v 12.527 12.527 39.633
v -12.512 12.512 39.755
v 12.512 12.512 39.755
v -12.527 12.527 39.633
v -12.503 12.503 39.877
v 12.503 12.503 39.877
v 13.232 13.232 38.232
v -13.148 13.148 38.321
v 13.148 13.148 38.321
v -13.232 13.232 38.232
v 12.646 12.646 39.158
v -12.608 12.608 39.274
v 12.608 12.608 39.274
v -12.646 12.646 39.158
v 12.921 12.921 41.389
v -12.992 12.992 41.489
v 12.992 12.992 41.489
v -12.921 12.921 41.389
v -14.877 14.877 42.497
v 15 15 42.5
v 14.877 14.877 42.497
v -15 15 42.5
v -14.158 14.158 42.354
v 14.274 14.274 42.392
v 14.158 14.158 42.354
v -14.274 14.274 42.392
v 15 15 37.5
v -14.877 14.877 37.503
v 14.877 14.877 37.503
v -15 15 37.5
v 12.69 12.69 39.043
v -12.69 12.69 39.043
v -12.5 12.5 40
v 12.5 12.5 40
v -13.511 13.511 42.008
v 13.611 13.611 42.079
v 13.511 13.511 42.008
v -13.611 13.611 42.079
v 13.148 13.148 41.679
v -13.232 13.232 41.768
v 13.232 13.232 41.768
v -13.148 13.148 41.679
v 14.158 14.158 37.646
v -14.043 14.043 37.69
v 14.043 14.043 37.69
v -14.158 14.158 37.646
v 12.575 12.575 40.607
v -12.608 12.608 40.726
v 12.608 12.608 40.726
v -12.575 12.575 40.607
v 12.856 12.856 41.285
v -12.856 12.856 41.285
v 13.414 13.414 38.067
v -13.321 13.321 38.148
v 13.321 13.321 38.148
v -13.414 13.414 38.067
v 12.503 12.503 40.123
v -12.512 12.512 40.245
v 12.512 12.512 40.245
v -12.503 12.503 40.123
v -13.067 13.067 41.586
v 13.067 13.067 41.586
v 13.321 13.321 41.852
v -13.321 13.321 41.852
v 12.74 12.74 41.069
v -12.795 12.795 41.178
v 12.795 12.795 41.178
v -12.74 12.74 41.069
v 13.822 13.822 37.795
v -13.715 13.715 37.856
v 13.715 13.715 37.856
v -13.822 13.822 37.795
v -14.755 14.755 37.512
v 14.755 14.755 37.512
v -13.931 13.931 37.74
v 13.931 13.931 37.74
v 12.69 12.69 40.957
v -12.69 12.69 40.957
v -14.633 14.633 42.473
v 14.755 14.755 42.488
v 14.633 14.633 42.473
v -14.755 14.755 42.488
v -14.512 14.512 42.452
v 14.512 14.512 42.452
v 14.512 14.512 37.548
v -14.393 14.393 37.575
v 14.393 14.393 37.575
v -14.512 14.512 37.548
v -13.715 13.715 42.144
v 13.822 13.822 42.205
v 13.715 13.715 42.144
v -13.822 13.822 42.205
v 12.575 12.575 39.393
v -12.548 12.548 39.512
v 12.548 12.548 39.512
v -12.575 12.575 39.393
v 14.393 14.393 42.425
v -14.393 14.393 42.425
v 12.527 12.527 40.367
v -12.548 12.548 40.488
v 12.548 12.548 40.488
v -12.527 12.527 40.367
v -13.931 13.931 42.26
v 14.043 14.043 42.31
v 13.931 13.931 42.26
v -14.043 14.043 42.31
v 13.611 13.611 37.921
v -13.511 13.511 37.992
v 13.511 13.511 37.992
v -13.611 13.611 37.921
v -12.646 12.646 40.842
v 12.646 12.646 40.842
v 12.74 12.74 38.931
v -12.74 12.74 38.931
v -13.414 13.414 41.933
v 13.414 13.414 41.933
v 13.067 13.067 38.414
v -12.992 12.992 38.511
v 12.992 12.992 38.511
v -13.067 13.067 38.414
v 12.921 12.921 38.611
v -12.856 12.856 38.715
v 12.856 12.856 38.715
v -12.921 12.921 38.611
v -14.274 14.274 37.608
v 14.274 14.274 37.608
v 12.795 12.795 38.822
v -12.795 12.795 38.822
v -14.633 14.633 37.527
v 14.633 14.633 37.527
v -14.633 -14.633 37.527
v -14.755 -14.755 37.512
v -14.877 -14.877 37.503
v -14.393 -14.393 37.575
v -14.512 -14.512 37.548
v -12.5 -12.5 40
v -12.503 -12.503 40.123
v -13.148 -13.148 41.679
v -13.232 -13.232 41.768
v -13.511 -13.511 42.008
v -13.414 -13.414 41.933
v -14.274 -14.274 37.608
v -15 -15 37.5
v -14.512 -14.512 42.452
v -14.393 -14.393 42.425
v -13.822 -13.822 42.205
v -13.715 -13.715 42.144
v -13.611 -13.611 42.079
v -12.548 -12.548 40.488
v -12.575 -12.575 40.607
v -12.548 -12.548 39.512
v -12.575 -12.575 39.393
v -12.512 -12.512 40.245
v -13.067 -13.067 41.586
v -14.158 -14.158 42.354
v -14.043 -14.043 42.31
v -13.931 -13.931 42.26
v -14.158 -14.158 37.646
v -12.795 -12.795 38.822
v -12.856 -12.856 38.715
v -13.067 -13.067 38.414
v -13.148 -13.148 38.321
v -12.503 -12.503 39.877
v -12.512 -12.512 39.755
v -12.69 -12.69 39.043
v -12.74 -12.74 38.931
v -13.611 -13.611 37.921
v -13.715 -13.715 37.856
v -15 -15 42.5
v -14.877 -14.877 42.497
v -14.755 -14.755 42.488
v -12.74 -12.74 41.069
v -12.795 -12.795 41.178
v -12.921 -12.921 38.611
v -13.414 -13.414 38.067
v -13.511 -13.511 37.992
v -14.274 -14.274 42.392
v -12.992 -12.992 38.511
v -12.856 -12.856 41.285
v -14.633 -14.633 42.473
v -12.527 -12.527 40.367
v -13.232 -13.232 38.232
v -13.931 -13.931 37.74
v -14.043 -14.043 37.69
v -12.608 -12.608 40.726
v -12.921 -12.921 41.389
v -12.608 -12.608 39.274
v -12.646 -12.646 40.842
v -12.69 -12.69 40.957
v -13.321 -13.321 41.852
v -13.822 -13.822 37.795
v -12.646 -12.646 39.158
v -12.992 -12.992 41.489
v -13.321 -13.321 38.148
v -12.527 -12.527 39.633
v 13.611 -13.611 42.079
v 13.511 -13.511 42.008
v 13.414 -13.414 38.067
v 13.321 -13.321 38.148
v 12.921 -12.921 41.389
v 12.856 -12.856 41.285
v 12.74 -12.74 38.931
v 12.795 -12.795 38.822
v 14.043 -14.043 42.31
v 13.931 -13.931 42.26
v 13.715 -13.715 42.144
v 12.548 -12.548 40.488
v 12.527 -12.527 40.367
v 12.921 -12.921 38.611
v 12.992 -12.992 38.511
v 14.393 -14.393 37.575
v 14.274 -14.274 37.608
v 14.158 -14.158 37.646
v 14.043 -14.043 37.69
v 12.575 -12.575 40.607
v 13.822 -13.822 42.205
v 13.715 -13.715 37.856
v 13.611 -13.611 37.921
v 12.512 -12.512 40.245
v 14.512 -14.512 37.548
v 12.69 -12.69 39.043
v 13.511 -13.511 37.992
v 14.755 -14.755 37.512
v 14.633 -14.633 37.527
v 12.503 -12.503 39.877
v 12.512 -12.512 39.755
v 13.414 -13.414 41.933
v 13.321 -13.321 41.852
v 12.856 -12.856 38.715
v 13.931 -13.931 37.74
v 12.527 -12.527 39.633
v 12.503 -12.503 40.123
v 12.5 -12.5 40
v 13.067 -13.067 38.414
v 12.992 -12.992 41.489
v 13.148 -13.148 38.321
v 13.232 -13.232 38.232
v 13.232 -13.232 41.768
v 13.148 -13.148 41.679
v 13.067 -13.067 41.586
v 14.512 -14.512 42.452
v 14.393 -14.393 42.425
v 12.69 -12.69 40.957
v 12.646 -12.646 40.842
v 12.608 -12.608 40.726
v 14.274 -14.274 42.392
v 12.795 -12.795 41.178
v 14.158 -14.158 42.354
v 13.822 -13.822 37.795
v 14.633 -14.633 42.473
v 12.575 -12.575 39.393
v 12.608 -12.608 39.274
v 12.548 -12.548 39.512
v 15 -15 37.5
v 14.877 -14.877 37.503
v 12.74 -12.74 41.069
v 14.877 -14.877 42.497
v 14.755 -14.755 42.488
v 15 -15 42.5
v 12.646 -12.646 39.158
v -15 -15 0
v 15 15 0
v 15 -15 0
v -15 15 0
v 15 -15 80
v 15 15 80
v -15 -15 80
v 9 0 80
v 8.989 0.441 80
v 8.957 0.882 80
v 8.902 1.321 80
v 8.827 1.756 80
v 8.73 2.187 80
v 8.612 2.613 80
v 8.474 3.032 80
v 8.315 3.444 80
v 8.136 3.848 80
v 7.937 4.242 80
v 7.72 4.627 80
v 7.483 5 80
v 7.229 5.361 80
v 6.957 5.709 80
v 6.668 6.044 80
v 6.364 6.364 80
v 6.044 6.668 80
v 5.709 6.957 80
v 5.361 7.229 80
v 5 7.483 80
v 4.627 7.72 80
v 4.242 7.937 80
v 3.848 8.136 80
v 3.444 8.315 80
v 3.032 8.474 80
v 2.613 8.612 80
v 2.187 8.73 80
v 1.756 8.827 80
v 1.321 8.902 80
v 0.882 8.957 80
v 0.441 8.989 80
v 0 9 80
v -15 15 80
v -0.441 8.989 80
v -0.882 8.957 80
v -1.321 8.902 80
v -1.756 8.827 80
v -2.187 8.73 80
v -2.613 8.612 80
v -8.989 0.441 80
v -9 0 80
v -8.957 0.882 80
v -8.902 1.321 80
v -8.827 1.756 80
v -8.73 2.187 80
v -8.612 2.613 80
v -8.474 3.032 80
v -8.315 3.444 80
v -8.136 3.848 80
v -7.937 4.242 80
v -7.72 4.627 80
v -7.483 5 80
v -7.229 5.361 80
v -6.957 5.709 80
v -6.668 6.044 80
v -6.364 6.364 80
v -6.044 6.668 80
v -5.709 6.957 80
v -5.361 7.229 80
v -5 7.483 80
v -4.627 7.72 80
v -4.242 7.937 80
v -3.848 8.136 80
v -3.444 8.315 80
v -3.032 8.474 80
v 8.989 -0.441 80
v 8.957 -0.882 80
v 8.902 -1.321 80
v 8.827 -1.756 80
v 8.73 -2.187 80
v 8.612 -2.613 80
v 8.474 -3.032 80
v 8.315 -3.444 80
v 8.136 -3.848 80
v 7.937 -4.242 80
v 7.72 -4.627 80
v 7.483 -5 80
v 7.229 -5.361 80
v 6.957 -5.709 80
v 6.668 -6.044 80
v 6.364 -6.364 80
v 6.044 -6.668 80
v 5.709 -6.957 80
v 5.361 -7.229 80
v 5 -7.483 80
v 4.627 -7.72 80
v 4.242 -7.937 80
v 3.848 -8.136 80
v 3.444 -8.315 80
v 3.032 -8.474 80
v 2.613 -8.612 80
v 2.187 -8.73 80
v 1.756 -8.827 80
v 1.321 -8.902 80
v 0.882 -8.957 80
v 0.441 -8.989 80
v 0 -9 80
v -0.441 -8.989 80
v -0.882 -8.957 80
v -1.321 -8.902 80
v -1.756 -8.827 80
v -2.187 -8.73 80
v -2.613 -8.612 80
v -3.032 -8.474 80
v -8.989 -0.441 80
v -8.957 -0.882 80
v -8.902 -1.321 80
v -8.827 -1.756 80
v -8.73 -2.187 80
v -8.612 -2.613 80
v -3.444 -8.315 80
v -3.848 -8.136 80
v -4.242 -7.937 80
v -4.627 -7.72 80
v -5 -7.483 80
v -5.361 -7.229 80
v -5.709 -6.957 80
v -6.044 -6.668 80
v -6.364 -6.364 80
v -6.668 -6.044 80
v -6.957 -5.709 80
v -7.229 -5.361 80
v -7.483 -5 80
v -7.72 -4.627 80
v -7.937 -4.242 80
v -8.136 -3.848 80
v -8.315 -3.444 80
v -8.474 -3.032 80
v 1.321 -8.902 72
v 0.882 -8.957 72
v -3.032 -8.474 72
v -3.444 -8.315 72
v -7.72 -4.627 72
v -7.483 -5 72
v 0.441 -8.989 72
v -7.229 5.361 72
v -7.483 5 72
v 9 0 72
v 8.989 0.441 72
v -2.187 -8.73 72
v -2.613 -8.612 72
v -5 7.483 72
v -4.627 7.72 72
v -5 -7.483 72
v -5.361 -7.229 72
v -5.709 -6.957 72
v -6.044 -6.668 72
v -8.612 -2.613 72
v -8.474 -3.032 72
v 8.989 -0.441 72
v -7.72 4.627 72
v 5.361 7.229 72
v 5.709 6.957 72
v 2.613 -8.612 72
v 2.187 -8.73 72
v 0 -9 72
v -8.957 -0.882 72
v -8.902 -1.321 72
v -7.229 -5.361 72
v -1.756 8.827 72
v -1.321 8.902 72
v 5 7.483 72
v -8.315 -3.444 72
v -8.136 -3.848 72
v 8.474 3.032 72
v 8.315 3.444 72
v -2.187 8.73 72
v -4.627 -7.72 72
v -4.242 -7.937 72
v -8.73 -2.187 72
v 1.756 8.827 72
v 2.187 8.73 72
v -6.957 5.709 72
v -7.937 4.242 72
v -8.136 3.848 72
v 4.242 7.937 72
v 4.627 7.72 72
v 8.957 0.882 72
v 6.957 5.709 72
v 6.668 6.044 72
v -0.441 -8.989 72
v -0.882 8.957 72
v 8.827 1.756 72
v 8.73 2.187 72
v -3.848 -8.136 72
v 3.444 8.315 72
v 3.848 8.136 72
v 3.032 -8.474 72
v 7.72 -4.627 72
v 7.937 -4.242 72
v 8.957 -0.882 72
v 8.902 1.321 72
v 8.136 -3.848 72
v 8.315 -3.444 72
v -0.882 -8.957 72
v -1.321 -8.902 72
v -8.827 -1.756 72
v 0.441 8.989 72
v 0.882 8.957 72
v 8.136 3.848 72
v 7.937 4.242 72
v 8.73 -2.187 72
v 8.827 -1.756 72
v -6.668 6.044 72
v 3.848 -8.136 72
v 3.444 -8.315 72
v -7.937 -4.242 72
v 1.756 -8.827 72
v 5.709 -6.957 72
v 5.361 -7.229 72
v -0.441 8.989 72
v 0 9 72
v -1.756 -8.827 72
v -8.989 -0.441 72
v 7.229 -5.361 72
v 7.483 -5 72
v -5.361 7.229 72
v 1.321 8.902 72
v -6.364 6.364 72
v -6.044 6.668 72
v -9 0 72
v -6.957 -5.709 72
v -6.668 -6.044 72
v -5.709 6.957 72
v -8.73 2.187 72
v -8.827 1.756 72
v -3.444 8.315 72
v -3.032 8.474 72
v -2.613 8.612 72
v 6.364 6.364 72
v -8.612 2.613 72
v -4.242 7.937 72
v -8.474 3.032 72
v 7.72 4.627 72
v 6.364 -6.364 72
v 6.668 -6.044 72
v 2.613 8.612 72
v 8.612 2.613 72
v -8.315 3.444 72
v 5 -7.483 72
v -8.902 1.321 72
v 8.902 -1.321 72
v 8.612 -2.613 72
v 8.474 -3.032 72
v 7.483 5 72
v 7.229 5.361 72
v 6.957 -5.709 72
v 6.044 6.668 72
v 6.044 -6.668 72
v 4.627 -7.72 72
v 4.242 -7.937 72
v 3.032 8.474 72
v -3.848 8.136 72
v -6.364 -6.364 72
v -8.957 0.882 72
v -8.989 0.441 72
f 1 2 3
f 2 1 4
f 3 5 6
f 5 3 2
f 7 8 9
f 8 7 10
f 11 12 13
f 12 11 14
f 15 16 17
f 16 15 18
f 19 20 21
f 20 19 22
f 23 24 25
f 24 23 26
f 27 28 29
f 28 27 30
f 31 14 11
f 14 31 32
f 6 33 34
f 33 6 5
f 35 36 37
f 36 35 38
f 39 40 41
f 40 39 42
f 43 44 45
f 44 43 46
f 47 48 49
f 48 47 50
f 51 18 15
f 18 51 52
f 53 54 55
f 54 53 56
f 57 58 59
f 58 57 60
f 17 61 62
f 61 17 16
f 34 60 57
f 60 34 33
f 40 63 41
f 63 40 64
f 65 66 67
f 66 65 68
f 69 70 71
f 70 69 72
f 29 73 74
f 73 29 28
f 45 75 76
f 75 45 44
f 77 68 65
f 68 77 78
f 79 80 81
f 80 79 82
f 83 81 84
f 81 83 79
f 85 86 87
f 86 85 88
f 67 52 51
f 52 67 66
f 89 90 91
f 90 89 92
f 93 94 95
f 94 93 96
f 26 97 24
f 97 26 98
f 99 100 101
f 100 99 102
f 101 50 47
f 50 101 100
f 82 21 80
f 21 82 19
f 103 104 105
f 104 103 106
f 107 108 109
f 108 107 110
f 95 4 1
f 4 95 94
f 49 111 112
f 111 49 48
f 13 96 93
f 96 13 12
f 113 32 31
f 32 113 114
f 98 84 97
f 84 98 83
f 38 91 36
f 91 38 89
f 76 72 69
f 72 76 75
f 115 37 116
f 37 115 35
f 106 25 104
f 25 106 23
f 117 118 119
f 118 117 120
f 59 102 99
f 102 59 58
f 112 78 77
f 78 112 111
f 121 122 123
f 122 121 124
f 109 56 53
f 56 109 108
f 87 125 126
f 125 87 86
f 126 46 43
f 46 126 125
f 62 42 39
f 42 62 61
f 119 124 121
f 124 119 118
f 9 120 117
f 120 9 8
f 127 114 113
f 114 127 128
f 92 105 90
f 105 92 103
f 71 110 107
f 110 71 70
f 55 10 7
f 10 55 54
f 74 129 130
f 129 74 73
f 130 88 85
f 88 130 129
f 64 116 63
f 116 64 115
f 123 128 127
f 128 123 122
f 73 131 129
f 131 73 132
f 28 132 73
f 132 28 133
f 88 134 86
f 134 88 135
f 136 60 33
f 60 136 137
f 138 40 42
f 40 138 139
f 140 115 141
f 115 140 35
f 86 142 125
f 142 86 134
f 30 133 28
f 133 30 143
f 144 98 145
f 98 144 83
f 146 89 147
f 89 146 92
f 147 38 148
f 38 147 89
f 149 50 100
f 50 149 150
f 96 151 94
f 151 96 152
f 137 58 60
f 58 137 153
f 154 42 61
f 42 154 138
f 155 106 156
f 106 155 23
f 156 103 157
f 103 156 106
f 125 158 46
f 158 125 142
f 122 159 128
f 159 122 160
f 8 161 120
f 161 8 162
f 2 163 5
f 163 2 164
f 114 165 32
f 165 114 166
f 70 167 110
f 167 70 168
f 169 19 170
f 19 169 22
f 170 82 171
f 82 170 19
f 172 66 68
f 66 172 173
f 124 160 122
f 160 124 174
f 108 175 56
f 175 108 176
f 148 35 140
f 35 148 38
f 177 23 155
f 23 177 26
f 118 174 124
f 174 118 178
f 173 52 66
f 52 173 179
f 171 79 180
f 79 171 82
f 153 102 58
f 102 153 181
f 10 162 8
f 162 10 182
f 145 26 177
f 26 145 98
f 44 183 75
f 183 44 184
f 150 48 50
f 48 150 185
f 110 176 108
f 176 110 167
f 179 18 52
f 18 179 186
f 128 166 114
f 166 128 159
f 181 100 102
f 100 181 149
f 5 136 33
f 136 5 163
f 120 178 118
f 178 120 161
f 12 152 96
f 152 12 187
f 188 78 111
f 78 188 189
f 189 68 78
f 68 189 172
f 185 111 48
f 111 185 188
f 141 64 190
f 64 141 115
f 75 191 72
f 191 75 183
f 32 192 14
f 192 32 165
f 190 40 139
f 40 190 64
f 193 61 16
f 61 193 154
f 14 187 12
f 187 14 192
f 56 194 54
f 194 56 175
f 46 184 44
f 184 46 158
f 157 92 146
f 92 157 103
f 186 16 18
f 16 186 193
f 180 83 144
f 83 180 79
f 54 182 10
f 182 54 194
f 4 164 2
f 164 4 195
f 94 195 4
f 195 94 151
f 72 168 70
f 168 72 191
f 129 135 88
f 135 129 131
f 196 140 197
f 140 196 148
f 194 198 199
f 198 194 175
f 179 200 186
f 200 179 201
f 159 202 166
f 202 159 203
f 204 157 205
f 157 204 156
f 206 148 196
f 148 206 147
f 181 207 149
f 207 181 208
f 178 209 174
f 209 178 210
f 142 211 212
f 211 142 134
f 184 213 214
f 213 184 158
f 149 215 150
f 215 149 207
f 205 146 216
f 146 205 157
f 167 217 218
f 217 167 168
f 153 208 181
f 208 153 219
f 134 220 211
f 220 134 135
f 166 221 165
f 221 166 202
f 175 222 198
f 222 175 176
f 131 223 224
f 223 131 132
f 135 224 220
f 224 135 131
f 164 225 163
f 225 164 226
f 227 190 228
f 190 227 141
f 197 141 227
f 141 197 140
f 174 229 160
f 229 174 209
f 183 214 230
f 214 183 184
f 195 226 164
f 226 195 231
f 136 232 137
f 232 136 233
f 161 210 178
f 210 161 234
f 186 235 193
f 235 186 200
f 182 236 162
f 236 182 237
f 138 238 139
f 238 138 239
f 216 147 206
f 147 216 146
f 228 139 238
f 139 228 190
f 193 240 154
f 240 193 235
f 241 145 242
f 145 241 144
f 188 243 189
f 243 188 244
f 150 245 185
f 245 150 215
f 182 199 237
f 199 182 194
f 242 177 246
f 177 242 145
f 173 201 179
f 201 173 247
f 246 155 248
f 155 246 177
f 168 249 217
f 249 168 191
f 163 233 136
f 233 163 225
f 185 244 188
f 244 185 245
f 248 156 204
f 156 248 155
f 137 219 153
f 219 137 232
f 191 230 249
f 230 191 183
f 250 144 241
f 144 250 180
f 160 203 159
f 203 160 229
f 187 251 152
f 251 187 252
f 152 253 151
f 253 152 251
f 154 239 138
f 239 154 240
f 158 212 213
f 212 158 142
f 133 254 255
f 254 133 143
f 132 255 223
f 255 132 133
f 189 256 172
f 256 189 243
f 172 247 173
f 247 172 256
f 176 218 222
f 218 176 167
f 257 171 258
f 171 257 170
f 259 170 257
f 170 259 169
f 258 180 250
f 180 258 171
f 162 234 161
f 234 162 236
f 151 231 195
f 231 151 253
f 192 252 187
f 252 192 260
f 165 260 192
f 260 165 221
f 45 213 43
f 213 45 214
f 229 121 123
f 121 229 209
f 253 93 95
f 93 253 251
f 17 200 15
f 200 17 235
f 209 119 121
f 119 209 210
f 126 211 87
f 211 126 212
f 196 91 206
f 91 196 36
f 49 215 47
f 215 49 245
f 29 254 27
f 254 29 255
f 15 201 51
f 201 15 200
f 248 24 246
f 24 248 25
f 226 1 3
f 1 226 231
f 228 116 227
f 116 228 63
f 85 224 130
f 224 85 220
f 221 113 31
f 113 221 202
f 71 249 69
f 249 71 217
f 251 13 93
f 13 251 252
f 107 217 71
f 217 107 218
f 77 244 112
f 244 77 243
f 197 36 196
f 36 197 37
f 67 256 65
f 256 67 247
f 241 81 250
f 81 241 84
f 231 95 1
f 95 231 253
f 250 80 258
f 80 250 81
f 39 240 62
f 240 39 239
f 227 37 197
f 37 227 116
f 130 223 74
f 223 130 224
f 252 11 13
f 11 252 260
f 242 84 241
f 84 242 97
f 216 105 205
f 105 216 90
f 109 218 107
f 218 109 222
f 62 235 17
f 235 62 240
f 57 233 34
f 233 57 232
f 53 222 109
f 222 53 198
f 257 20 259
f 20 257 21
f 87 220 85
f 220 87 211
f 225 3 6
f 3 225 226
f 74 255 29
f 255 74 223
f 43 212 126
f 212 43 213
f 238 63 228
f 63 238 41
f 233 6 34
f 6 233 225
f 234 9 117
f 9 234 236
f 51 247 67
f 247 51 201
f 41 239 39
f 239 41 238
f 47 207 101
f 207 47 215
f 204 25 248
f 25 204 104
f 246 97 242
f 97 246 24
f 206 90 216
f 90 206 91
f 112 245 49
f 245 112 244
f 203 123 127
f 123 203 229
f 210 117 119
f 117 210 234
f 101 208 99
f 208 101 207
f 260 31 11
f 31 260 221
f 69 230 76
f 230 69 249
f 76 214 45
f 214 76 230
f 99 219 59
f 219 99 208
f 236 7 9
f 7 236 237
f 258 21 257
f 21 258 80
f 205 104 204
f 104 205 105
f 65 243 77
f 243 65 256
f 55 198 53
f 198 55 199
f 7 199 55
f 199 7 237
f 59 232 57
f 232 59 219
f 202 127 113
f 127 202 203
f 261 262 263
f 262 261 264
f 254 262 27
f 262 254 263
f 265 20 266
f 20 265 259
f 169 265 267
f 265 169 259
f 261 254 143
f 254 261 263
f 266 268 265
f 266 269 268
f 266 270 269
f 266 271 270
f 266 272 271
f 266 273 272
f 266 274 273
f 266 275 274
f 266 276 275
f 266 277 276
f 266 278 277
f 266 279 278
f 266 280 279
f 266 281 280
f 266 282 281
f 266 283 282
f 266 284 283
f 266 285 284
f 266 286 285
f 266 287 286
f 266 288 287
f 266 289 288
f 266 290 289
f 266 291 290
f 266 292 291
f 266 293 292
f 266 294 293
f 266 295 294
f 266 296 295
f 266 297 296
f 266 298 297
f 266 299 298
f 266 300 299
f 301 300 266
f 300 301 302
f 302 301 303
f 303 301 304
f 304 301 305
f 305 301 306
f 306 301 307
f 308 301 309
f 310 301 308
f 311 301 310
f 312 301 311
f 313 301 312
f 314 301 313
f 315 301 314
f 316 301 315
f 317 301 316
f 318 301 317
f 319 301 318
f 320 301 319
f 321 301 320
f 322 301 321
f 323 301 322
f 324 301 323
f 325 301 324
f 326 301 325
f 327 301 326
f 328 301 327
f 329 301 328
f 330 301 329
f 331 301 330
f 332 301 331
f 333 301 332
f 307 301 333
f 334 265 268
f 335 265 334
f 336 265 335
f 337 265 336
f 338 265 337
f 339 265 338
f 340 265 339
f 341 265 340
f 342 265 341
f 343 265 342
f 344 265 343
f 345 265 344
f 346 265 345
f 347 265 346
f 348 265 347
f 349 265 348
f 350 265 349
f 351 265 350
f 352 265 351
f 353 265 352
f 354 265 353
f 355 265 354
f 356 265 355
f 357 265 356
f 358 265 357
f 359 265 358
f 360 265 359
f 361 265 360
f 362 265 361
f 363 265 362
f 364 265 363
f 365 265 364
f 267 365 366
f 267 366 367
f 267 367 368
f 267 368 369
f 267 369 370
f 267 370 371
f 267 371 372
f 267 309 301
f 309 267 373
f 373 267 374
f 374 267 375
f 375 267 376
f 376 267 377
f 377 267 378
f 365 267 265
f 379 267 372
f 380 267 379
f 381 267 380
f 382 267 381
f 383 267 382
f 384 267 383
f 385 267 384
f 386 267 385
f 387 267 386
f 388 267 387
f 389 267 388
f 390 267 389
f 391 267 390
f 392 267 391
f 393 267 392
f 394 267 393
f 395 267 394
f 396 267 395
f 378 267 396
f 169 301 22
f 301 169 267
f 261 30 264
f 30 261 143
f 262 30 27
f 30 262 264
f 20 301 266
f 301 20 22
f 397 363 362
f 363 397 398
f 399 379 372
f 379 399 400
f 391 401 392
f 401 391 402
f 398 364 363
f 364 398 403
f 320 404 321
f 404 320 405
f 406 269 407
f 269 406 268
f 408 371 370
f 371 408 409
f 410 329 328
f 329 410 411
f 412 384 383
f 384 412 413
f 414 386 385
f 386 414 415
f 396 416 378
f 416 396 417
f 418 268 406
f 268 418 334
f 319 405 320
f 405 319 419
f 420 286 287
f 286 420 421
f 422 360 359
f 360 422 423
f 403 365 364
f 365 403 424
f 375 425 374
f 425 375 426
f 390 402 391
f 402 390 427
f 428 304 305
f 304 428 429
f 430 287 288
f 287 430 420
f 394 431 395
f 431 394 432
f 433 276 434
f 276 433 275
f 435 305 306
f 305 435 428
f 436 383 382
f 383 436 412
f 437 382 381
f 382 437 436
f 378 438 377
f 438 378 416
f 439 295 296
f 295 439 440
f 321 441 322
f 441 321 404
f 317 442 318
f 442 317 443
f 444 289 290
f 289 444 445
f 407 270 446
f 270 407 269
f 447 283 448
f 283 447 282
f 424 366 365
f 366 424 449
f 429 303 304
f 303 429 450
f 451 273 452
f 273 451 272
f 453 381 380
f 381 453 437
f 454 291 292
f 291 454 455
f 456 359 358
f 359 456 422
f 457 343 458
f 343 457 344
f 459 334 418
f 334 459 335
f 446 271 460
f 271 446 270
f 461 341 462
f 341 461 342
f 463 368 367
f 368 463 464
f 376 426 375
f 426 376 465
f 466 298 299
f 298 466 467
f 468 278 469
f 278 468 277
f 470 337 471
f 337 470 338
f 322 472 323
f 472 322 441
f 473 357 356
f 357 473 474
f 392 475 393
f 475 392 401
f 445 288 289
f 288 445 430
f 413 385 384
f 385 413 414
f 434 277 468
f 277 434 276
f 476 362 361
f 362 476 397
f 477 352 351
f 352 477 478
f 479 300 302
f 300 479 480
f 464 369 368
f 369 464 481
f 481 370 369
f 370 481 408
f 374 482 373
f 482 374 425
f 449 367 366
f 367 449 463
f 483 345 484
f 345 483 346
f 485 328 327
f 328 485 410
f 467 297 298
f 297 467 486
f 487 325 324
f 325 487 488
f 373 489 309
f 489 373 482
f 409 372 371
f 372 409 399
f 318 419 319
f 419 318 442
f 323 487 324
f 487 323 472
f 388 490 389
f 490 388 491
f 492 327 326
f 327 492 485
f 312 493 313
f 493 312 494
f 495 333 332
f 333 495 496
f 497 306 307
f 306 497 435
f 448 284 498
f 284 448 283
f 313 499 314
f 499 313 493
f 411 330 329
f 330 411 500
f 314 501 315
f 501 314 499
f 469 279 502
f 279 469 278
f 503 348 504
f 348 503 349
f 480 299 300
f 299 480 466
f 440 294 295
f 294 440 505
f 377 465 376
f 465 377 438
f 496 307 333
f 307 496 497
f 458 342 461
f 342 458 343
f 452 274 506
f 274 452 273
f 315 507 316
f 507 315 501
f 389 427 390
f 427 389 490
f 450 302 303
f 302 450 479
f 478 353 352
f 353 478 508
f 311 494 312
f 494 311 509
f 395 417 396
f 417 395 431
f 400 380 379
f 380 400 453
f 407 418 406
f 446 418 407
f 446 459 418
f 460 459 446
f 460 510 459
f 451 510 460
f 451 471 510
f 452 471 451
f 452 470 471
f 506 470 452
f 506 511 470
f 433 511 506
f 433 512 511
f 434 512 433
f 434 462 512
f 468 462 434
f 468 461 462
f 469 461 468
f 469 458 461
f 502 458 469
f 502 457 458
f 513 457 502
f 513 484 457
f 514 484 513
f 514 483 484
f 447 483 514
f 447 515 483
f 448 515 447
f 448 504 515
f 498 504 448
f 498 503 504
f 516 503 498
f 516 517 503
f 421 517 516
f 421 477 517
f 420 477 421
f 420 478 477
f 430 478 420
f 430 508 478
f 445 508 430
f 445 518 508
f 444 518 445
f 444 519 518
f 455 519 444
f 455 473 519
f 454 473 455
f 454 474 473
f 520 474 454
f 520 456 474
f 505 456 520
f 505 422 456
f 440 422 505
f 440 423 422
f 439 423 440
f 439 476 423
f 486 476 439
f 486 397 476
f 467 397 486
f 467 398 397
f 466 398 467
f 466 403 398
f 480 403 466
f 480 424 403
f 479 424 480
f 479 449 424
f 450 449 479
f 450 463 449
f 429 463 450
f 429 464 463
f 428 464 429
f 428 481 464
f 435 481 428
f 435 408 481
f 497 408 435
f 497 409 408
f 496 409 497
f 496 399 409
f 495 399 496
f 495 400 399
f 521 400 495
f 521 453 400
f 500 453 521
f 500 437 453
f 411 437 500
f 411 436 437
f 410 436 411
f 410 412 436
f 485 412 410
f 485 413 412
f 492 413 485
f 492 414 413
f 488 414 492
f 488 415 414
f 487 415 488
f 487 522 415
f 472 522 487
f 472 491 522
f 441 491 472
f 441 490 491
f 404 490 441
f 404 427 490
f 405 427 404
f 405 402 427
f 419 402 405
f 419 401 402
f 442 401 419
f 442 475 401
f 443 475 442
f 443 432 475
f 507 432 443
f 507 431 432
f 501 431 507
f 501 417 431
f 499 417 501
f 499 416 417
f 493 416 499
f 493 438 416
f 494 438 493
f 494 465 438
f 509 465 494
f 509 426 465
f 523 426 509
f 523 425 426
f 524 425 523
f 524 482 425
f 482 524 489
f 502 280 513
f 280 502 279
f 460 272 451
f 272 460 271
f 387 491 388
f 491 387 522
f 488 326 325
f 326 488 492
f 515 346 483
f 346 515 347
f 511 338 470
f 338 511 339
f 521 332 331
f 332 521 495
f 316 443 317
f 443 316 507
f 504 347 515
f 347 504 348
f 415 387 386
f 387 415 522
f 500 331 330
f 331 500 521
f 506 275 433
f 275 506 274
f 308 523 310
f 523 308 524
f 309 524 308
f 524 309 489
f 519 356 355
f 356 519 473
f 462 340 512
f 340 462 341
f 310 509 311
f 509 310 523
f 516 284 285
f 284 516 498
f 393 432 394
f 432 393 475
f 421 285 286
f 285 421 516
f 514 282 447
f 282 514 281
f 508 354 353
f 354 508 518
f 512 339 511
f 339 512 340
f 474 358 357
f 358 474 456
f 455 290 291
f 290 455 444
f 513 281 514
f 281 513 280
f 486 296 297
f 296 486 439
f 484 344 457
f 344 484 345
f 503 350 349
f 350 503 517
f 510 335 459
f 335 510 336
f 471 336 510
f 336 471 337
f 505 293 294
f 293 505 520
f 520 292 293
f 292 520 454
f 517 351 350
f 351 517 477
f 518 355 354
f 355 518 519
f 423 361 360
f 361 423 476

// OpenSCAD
difference()
{
    difference()
    {
        linear_extrude(height = 80.0, twist = 0.0, scale = 1.0, slices = 1, center = false)
        {
            scale([30.0, 30.0])
            {
                M8();
            }
        }
        union()
        {
            union()
            {
                union()
                {
                    translate([-15.0, 15.0, 40.0])
                    {
                        rotate([0.0, 0.0, 0.0])
                        {
                            rotate([0.0, 90.0, 0.0])
                            {
                                rotate([0.0, 0.0, 0.0])
                                {
                                    linear_extrude(height = 31.0, twist = 0.0, scale = 1.0, slices = 1, center = false)
                                    {
                                        scale([5.0, 5.0])
                                        {
                                            M196();
                                        }
                                    }
                                }
                            }
                        }
                    }
                    translate([-15.0, 15.0, 40.0])
                    {
                        rotate([0.0, 0.0, 0.0])
                        {
                            rotate([0.0, 0.0, 0.0])
                            {
                                rotate([90.0, 0.0, 0.0])
                                {
                                    linear_extrude(height = 31.0, twist = 0.0, scale = 1.0, slices = 1, center = false)
                                    {
                                        scale([5.0, 5.0])
                                        {
                                            M196();
                                        }
                                    }
                                }
                            }
                        }
                    }
                }
                translate([-15.0, -15.0, 40.0])
                {
                    rotate([0.0, 0.0, 0.0])
                    {
                        rotate([0.0, 90.0, 0.0])
                        {
                            rotate([0.0, 0.0, 0.0])
                            {
                                linear_extrude(height = 31.0, twist = 0.0, scale = 1.0, slices = 1, center = false)
                                {
                                    scale([5.0, 5.0])
                                    {
                                        M196();
                                    }
                                }
                            }
                        }
                    }
                }
            }
            translate([15.0, 15.0, 40.0])
            {
                rotate([0.0, 0.0, 0.0])
                {
                    rotate([0.0, 0.0, 0.0])
                    {
                        rotate([90.0, 0.0, 0.0])
                        {
                            linear_extrude(height = 31.0, twist = 0.0, scale = 1.0, slices = 1, center = false)
                            {
                                scale([5.0, 5.0])
                                {
                                    M196();
                                }
                            }
                        }
                    }
                }
            }
        }
    }
    translate([0.0, 0.0, 72.0])
    {
        linear_extrude(height = 10.0, twist = 0.0, scale = 1.0, slices = 1, center = false)
        {
            difference()
            {
                scale([18.0, 18.0])
                {
                    M196();
                }
                scale([0.0, 0.0])
                {
                    M196();
                }
            }
        }
    }
}

module M196()
{
    polygon
    (
        points =
        [
            [0.5, 0.0], 
            [0.4993977281025862, 0.024533837163709007], 
            [0.49759236333609846, 0.0490085701647803], 
            [0.4945882549823905, 0.07336523722768087], 
            [0.4903926402016152, 0.09754516100806412], 
            [0.485015626597272, 0.12149008995163194], 
            [0.4784701678661044, 0.14514233862723117], 
            [0.4707720325915104, 0.16844492669611003], 
            [0.46193976625564337, 0.1913417161825449], 
            [0.45199464656172167, 0.21377754671514104], 
            [0.4409606321741775, 0.23569836841299882], 
            [0.42886430500013606, 0.25705137209661083], 
            [0.4157348061512726, 0.2777851165098011], 
            [0.40160376574032247, 0.2978496522462167], 
            [0.3865052266813685, 0.31719664208182274], 
            [0.37047556267747955, 0.33577947742350917], 
            [0.3535533905932738, 0.35355339059327373], 
            [0.33577947742350917, 0.37047556267747955], 
            [0.31719664208182274, 0.3865052266813685], 
            [0.29784965224621673, 0.4016037657403224], 
            [0.27778511650980114, 0.4157348061512726], 
            [0.25705137209661083, 0.42886430500013606], 
            [0.2356983684129989, 0.44096063217417747], 
            [0.2137775467151411, 0.45199464656172167], 
            [0.19134171618254492, 0.46193976625564337], 
            [0.16844492669611003, 0.4707720325915104], 
            [0.14514233862723117, 0.47847016786610447], 
            [0.12149008995163199, 0.485015626597272], 
            [0.09754516100806417, 0.4903926402016152], 
            [0.07336523722768087, 0.4945882549823905], 
            [0.049008570164780385, 0.4975923633360984], 
            [0.024533837163709063, 0.4993977281025862], 
            [3.061616997868383E-17, 0.5], 
            [-0.024533837163709004, 0.4993977281025862], 
            [-0.04900857016478032, 0.49759236333609846], 
            [-0.07336523722768082, 0.4945882549823905], 
            [-0.0975451610080641, 0.4903926402016152], 
            [-0.12149008995163194, 0.485015626597272], 
            [-0.14514233862723108, 0.47847016786610447], 
            [-0.16844492669610997, 0.4707720325915104], 
            [-0.19134171618254486, 0.46193976625564337], 
            [-0.21377754671514093, 0.4519946465617217], 
            [-0.23569836841299885, 0.4409606321741775], 
            [-0.25705137209661083, 0.42886430500013606], 
            [-0.277785116509801, 0.41573480615127273], 
            [-0.2978496522462167, 0.40160376574032247], 
            [-0.3171966420818227, 0.38650522668136855], 
            [-0.3357794774235092, 0.3704755626774795], 
            [-0.35355339059327373, 0.3535533905932738], 
            [-0.37047556267747944, 0.3357794774235093], 
            [-0.3865052266813685, 0.31719664208182274], 
            [-0.4016037657403224, 0.29784965224621673], 
            [-0.4157348061512727, 0.2777851165098011], 
            [-0.428864305000136, 0.2570513720966109], 
            [-0.44096063217417747, 0.23569836841299893], 
            [-0.45199464656172167, 0.21377754671514101], 
            [-0.46193976625564337, 0.19134171618254495], 
            [-0.47077203259151035, 0.16844492669611016], 
            [-0.4784701678661044, 0.1451423386272312], 
            [-0.485015626597272, 0.12149008995163203], 
            [-0.4903926402016152, 0.0975451610080643], 
            [-0.4945882549823905, 0.0733652372276809], 
            [-0.4975923633360984, 0.04900857016478041], 
            [-0.4993977281025862, 0.024533837163708983], 
            [-0.5, 6.123233995736766E-17], 
            [-0.4993977281025862, -0.024533837163708862], 
            [-0.49759236333609846, -0.049008570164780295], 
            [-0.4945882549823905, -0.07336523722768079], 
            [-0.4903926402016152, -0.09754516100806418], 
            [-0.485015626597272, -0.12149008995163191], 
            [-0.47847016786610447, -0.14514233862723105], 
            [-0.4707720325915104, -0.16844492669611005], 
            [-0.4619397662556434, -0.19134171618254484], 
            [-0.4519946465617217, -0.2137775467151409], 
            [-0.4409606321741775, -0.23569836841299882], 
            [-0.42886430500013606, -0.2570513720966108], 
            [-0.41573480615127273, -0.277785116509801], 
            [-0.40160376574032247, -0.2978496522462166], 
            [-0.38650522668136855, -0.31719664208182263], 
            [-0.37047556267747955, -0.3357794774235092], 
            [-0.35355339059327384, -0.35355339059327373], 
            [-0.33577947742350933, -0.37047556267747944], 
            [-0.31719664208182297, -0.38650522668136833], 
            [-0.29784965224621657, -0.4016037657403225], 
            [-0.2777851165098011, -0.4157348061512726], 
            [-0.2570513720966109, -0.428864305000136], 
            [-0.23569836841299893, -0.44096063217417747], 
            [-0.21377754671514124, -0.45199464656172156], 
            [-0.19134171618254517, -0.46193976625564326], 
            [-0.16844492669610997, -0.4707720325915104], 
            [-0.14514233862723122, -0.4784701678661044], 
            [-0.12149008995163206, -0.485015626597272], 
            [-0.09754516100806433, -0.49039264020161516], 
            [-0.07336523722768115, -0.49458825498239045], 
            [-0.049008570164780225, -0.49759236333609846], 
            [-0.024533837163709014, -0.4993977281025862], 
            [-9.184850993605148E-17, -0.5], 
            [0.02453383716370883, -0.4993977281025862], 
            [0.049008570164780045, -0.49759236333609846], 
            [0.07336523722768097, -0.49458825498239045], 
            [0.09754516100806415, -0.4903926402016152], 
            [0.12149008995163188, -0.485015626597272], 
            [0.14514233862723103, -0.47847016786610447], 
            [0.1684449266961098, -0.47077203259151046], 
            [0.191341716182545, -0.4619397662556433], 
            [0.21377754671514107, -0.45199464656172167], 
            [0.2356983684129988, -0.4409606321741775], 
            [0.2570513720966108, -0.4288643050001361], 
            [0.2777851165098009, -0.41573480615127273], 
            [0.29784965224621646, -0.40160376574032264], 
            [0.3171966420818228, -0.38650522668136844], 
            [0.33577947742350917, -0.37047556267747955], 
            [0.3535533905932737, -0.35355339059327384], 
            [0.37047556267747944, -0.33577947742350933], 
            [0.38650522668136833, -0.31719664208182297], 
            [0.4016037657403225, -0.2978496522462166], 
            [0.4157348061512726, -0.2777851165098011], 
            [0.428864305000136, -0.25705137209661094], 
            [0.4409606321741774, -0.23569836841299896], 
            [0.45199464656172156, -0.21377754671514126], 
            [0.46193976625564326, -0.1913417161825452], 
            [0.4707720325915104, -0.16844492669611], 
            [0.4784701678661044, -0.14514233862723125], 
            [0.485015626597272, -0.12149008995163209], 
            [0.49039264020161516, -0.09754516100806436], 
            [0.49458825498239045, -0.0733652372276812], 
            [0.49759236333609846, -0.04900857016478025], 
            [0.4993977281025862, -0.024533837163709046]
        ],
        paths =
        [
            [0, 1, 2, 3, 4, 5, 6, 7, 8, 9, 10, 11, 12, 13, 14, 15, 16, 17, 18, 19, 20, 21, 22, 23, 24, 25, 26, 27, 28, 29, 30, 31, 32, 33, 34, 35, 36, 37, 38, 39, 40, 41, 42, 43, 44, 45, 46, 47, 48, 49, 50, 51, 52, 53, 54, 55, 56, 57, 58, 59, 60, 61, 62, 63, 64, 65, 66, 67, 68, 69, 70, 71, 72, 73, 74, 75, 76, 77, 78, 79, 80, 81, 82, 83, 84, 85, 86, 87, 88, 89, 90, 91, 92, 93, 94, 95, 96, 97, 98, 99, 100, 101, 102, 103, 104, 105, 106, 107, 108, 109, 110, 111, 112, 113, 114, 115, 116, 117, 118, 119, 120, 121, 122, 123, 124, 125, 126, 127]
        ]
    );
}

module M8()
{
    polygon
    (
        points =
        [
            [-0.5, -0.5], 
            [0.5, -0.5], 
            [0.5, 0.5], 
            [-0.5, 0.5]
        ],
        paths =
        [
            [0, 1, 2, 3]
        ]
    );
}
